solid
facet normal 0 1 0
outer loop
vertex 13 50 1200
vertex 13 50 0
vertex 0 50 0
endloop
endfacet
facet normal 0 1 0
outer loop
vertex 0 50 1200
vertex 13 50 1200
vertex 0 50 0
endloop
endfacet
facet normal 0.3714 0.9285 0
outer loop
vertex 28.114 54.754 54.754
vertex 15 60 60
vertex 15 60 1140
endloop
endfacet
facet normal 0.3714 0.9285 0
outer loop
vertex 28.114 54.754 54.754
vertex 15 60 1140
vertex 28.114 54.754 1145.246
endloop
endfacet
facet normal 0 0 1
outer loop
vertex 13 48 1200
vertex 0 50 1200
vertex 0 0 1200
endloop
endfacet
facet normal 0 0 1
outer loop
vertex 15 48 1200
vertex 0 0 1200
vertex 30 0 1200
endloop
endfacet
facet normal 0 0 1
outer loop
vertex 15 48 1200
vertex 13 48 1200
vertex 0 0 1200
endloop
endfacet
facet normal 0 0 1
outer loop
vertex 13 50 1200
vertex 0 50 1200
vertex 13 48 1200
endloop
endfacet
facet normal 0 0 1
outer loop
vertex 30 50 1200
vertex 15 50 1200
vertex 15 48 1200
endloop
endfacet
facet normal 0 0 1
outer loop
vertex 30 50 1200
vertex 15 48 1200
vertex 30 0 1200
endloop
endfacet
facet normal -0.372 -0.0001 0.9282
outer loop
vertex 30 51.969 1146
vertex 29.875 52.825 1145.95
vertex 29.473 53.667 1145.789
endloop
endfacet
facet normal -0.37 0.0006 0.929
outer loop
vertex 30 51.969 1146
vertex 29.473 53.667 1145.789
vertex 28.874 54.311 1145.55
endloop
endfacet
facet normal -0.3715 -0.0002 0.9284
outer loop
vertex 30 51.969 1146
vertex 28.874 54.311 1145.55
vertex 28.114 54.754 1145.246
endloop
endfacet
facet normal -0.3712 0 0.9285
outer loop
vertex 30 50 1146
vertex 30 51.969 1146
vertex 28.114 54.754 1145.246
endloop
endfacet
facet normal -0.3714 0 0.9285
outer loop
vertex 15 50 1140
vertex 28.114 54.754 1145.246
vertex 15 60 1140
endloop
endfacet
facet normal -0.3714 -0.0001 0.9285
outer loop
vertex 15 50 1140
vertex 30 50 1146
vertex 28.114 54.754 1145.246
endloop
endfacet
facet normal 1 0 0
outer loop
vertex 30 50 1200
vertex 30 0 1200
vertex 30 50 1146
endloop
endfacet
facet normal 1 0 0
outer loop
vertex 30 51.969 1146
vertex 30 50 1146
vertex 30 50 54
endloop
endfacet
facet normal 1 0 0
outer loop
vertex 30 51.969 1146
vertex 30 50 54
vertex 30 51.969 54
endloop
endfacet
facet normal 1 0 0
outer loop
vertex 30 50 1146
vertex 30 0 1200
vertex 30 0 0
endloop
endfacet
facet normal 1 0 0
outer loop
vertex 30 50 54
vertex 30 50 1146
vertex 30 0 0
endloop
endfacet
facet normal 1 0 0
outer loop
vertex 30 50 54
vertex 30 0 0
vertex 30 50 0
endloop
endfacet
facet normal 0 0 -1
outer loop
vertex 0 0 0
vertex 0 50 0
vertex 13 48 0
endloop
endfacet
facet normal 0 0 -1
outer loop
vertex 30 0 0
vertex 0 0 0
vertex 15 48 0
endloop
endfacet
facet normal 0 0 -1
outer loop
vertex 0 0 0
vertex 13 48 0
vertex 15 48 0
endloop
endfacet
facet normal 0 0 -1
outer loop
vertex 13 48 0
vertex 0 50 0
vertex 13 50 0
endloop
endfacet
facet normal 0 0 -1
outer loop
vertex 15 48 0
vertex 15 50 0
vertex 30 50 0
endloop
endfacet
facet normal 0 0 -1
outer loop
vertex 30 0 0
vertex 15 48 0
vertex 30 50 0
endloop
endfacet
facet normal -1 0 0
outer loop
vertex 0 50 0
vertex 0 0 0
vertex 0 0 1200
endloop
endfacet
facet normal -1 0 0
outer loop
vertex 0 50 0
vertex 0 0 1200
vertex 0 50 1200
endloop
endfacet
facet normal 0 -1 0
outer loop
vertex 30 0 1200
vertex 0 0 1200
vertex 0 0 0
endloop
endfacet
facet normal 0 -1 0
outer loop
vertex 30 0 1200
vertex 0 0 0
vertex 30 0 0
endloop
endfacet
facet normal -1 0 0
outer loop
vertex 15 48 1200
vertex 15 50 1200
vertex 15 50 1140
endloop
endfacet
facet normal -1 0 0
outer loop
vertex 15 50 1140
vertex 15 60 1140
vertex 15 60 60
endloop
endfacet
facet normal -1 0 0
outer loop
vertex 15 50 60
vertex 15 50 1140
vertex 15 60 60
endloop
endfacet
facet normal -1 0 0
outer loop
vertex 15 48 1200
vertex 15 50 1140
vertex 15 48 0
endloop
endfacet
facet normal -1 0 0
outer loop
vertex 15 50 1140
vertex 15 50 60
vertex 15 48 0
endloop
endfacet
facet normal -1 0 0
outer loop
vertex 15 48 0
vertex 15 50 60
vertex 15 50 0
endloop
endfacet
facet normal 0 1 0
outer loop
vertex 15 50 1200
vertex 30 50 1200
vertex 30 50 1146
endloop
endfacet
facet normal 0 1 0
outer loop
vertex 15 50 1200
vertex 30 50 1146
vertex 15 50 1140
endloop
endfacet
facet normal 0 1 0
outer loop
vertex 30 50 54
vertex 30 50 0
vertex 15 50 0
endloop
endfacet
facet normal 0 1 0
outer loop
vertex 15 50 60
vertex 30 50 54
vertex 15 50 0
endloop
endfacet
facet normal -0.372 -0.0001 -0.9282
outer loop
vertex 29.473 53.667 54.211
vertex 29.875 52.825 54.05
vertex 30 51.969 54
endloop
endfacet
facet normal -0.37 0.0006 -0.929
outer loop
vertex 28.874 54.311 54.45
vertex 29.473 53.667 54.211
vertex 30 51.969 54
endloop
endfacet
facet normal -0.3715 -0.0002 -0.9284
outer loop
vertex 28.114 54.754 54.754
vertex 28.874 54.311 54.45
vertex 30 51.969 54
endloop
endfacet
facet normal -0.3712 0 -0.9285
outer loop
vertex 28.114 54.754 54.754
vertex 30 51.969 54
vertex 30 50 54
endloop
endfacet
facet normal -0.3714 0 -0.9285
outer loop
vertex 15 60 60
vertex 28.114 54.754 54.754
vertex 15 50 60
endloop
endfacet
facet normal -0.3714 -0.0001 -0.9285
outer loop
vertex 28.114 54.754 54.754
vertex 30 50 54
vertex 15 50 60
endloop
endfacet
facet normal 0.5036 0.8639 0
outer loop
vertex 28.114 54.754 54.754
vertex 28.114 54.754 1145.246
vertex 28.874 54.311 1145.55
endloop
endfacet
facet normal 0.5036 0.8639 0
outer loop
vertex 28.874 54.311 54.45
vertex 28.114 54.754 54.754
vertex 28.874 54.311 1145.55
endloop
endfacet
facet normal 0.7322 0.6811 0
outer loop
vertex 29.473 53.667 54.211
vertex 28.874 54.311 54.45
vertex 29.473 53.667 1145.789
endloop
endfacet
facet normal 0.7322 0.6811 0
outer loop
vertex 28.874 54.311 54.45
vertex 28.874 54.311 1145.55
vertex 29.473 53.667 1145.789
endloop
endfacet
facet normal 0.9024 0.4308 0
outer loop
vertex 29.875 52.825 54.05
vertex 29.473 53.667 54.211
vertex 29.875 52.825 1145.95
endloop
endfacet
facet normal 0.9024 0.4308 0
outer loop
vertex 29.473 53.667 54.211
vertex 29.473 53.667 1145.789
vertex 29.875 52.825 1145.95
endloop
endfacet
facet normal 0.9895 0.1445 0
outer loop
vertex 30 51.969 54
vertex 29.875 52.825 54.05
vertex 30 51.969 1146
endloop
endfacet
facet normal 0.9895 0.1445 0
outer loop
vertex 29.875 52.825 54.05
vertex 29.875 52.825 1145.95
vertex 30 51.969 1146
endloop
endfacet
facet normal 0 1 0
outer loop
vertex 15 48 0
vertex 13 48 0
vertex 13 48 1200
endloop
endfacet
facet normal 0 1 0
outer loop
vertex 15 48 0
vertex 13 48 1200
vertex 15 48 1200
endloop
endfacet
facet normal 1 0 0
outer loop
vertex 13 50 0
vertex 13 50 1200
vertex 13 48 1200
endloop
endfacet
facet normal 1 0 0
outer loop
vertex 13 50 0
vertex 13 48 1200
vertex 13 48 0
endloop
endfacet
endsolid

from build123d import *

# Parameters (mm, degrees)
ESQUISSE1_W                  = 30
ESQUISSE1_H                  = 60
BOSS_EXTRU_1_DEPTH           = 1200
ENL_V_MAT_EXTRU_4_DEPTH      = 1202.873537441
ENL_V_MAT_EXTRU_4_DEPTH_BACK = 1202.873537441
ESQUISSE5_W                  = 15
ESQUISSE5_H                  = 10
ENL_V_MAT_EXTRU_2_DEPTH      = 1202.873537441
ENL_V_MAT_EXTRU_2_DEPTH_BACK = 1202.873537441
CONG_1_R                     = 3
ENL_V_MAT_EXTRU_5_REACH      = 1203.416
ESQUISSE7_W                  = 2
ESQUISSE7_H                  = 1200
ENL_V_MAT_EXTRU_6_DEPTH      = 2


with BuildPart() as part:
    # Esquisse1 → Boss.-Extru.1 (new body)
    with BuildSketch(Plane.XY):
        with Locations((15, 30)):
            Rectangle(ESQUISSE1_W, ESQUISSE1_H)
    extrude(amount=BOSS_EXTRU_1_DEPTH)

    # Esquisse5 → Enlèv. mat.-Extru.4 (cut, two sides: drawn at the far end of the back side and taken through both)
    with BuildSketch(Plane.XY.offset(1200).offset(-ENL_V_MAT_EXTRU_4_DEPTH_BACK)):
        with Locations((7.5, 55)):
            Rectangle(ESQUISSE5_W, ESQUISSE5_H)
    extrude(amount=ENL_V_MAT_EXTRU_4_DEPTH + ENL_V_MAT_EXTRU_4_DEPTH_BACK, mode=Mode.SUBTRACT)

    # Esquisse3 → Enlèv. mat.-Extru.2 (cut, two sides: drawn at the far end of the back side and taken through both)
    with BuildSketch(Plane.XY.offset(1200).offset(-ENL_V_MAT_EXTRU_2_DEPTH_BACK)):
        Polygon((15, 60), (30, 54), (30, 60), align=None)
    extrude(amount=ENL_V_MAT_EXTRU_2_DEPTH + ENL_V_MAT_EXTRU_2_DEPTH_BACK, mode=Mode.SUBTRACT)

    # Congé1
    cong_1_edges = [part.edges().sort_by_distance(p)[0] for p in [
        (30, 54, 600),
    ]]
    fillet(cong_1_edges, radius=CONG_1_R)

    # Enlèv. mat.-Extru.5: up to this plane
    enl_v_mat_extru_5_end = Plane(origin=(15, 60, 0), z_dir=(-0.37139067635410367, -0.9284766908852594, 0))
    # Esquisse6 → Enlèv. mat.-Extru.5 (cut, up to the surface)
    with BuildSketch(Plane(origin=(0, 50, 0), x_dir=(1, 0, 0), z_dir=(0, 1, 0)), mode=Mode.PRIVATE) as enl_v_mat_extru_5_sk1:
        Polygon((0, -1200), (30, -1200), (30, -1146), (15, -1140), (0, -1140), align=None)
    enl_v_mat_extru_5_tool1 = split(extrude(enl_v_mat_extru_5_sk1.sketch, amount=ENL_V_MAT_EXTRU_5_REACH, mode=Mode.PRIVATE), bisect_by=enl_v_mat_extru_5_end, keep=Keep.BOTH, mode=Mode.PRIVATE)
    add(enl_v_mat_extru_5_tool1.solids().sort_by_distance((14.74359, 50, 1170.717949))[0], mode=Mode.SUBTRACT)
    # Esquisse6 → Enlèv. mat.-Extru.5 (cut, up to the surface)
    with BuildSketch(Plane(origin=(0, 50, 0), x_dir=(1, 0, 0), z_dir=(0, 1, 0)), mode=Mode.PRIVATE) as enl_v_mat_extru_5_sk2:
        Polygon((0, -60), (0, 0), (30, 0), (30, -54), (15, -60), align=None)
    enl_v_mat_extru_5_tool2 = split(extrude(enl_v_mat_extru_5_sk2.sketch, amount=ENL_V_MAT_EXTRU_5_REACH, mode=Mode.PRIVATE), bisect_by=enl_v_mat_extru_5_end, keep=Keep.BOTH, mode=Mode.PRIVATE)
    add(enl_v_mat_extru_5_tool2.solids().sort_by_distance((14.74359, 50, 29.282051))[0], mode=Mode.SUBTRACT)

    # Esquisse7 → Enlèv. mat.-Extru.6 (cut)
    with BuildSketch(Plane(origin=(0, 50, 0), x_dir=(1, 0, 0), z_dir=(0, 1, 0))):
        with Locations((14, -600)):
            Rectangle(ESQUISSE7_W, ESQUISSE7_H)
    extrude(amount=-ENL_V_MAT_EXTRU_6_DEPTH, mode=Mode.SUBTRACT)


solid = part.part
